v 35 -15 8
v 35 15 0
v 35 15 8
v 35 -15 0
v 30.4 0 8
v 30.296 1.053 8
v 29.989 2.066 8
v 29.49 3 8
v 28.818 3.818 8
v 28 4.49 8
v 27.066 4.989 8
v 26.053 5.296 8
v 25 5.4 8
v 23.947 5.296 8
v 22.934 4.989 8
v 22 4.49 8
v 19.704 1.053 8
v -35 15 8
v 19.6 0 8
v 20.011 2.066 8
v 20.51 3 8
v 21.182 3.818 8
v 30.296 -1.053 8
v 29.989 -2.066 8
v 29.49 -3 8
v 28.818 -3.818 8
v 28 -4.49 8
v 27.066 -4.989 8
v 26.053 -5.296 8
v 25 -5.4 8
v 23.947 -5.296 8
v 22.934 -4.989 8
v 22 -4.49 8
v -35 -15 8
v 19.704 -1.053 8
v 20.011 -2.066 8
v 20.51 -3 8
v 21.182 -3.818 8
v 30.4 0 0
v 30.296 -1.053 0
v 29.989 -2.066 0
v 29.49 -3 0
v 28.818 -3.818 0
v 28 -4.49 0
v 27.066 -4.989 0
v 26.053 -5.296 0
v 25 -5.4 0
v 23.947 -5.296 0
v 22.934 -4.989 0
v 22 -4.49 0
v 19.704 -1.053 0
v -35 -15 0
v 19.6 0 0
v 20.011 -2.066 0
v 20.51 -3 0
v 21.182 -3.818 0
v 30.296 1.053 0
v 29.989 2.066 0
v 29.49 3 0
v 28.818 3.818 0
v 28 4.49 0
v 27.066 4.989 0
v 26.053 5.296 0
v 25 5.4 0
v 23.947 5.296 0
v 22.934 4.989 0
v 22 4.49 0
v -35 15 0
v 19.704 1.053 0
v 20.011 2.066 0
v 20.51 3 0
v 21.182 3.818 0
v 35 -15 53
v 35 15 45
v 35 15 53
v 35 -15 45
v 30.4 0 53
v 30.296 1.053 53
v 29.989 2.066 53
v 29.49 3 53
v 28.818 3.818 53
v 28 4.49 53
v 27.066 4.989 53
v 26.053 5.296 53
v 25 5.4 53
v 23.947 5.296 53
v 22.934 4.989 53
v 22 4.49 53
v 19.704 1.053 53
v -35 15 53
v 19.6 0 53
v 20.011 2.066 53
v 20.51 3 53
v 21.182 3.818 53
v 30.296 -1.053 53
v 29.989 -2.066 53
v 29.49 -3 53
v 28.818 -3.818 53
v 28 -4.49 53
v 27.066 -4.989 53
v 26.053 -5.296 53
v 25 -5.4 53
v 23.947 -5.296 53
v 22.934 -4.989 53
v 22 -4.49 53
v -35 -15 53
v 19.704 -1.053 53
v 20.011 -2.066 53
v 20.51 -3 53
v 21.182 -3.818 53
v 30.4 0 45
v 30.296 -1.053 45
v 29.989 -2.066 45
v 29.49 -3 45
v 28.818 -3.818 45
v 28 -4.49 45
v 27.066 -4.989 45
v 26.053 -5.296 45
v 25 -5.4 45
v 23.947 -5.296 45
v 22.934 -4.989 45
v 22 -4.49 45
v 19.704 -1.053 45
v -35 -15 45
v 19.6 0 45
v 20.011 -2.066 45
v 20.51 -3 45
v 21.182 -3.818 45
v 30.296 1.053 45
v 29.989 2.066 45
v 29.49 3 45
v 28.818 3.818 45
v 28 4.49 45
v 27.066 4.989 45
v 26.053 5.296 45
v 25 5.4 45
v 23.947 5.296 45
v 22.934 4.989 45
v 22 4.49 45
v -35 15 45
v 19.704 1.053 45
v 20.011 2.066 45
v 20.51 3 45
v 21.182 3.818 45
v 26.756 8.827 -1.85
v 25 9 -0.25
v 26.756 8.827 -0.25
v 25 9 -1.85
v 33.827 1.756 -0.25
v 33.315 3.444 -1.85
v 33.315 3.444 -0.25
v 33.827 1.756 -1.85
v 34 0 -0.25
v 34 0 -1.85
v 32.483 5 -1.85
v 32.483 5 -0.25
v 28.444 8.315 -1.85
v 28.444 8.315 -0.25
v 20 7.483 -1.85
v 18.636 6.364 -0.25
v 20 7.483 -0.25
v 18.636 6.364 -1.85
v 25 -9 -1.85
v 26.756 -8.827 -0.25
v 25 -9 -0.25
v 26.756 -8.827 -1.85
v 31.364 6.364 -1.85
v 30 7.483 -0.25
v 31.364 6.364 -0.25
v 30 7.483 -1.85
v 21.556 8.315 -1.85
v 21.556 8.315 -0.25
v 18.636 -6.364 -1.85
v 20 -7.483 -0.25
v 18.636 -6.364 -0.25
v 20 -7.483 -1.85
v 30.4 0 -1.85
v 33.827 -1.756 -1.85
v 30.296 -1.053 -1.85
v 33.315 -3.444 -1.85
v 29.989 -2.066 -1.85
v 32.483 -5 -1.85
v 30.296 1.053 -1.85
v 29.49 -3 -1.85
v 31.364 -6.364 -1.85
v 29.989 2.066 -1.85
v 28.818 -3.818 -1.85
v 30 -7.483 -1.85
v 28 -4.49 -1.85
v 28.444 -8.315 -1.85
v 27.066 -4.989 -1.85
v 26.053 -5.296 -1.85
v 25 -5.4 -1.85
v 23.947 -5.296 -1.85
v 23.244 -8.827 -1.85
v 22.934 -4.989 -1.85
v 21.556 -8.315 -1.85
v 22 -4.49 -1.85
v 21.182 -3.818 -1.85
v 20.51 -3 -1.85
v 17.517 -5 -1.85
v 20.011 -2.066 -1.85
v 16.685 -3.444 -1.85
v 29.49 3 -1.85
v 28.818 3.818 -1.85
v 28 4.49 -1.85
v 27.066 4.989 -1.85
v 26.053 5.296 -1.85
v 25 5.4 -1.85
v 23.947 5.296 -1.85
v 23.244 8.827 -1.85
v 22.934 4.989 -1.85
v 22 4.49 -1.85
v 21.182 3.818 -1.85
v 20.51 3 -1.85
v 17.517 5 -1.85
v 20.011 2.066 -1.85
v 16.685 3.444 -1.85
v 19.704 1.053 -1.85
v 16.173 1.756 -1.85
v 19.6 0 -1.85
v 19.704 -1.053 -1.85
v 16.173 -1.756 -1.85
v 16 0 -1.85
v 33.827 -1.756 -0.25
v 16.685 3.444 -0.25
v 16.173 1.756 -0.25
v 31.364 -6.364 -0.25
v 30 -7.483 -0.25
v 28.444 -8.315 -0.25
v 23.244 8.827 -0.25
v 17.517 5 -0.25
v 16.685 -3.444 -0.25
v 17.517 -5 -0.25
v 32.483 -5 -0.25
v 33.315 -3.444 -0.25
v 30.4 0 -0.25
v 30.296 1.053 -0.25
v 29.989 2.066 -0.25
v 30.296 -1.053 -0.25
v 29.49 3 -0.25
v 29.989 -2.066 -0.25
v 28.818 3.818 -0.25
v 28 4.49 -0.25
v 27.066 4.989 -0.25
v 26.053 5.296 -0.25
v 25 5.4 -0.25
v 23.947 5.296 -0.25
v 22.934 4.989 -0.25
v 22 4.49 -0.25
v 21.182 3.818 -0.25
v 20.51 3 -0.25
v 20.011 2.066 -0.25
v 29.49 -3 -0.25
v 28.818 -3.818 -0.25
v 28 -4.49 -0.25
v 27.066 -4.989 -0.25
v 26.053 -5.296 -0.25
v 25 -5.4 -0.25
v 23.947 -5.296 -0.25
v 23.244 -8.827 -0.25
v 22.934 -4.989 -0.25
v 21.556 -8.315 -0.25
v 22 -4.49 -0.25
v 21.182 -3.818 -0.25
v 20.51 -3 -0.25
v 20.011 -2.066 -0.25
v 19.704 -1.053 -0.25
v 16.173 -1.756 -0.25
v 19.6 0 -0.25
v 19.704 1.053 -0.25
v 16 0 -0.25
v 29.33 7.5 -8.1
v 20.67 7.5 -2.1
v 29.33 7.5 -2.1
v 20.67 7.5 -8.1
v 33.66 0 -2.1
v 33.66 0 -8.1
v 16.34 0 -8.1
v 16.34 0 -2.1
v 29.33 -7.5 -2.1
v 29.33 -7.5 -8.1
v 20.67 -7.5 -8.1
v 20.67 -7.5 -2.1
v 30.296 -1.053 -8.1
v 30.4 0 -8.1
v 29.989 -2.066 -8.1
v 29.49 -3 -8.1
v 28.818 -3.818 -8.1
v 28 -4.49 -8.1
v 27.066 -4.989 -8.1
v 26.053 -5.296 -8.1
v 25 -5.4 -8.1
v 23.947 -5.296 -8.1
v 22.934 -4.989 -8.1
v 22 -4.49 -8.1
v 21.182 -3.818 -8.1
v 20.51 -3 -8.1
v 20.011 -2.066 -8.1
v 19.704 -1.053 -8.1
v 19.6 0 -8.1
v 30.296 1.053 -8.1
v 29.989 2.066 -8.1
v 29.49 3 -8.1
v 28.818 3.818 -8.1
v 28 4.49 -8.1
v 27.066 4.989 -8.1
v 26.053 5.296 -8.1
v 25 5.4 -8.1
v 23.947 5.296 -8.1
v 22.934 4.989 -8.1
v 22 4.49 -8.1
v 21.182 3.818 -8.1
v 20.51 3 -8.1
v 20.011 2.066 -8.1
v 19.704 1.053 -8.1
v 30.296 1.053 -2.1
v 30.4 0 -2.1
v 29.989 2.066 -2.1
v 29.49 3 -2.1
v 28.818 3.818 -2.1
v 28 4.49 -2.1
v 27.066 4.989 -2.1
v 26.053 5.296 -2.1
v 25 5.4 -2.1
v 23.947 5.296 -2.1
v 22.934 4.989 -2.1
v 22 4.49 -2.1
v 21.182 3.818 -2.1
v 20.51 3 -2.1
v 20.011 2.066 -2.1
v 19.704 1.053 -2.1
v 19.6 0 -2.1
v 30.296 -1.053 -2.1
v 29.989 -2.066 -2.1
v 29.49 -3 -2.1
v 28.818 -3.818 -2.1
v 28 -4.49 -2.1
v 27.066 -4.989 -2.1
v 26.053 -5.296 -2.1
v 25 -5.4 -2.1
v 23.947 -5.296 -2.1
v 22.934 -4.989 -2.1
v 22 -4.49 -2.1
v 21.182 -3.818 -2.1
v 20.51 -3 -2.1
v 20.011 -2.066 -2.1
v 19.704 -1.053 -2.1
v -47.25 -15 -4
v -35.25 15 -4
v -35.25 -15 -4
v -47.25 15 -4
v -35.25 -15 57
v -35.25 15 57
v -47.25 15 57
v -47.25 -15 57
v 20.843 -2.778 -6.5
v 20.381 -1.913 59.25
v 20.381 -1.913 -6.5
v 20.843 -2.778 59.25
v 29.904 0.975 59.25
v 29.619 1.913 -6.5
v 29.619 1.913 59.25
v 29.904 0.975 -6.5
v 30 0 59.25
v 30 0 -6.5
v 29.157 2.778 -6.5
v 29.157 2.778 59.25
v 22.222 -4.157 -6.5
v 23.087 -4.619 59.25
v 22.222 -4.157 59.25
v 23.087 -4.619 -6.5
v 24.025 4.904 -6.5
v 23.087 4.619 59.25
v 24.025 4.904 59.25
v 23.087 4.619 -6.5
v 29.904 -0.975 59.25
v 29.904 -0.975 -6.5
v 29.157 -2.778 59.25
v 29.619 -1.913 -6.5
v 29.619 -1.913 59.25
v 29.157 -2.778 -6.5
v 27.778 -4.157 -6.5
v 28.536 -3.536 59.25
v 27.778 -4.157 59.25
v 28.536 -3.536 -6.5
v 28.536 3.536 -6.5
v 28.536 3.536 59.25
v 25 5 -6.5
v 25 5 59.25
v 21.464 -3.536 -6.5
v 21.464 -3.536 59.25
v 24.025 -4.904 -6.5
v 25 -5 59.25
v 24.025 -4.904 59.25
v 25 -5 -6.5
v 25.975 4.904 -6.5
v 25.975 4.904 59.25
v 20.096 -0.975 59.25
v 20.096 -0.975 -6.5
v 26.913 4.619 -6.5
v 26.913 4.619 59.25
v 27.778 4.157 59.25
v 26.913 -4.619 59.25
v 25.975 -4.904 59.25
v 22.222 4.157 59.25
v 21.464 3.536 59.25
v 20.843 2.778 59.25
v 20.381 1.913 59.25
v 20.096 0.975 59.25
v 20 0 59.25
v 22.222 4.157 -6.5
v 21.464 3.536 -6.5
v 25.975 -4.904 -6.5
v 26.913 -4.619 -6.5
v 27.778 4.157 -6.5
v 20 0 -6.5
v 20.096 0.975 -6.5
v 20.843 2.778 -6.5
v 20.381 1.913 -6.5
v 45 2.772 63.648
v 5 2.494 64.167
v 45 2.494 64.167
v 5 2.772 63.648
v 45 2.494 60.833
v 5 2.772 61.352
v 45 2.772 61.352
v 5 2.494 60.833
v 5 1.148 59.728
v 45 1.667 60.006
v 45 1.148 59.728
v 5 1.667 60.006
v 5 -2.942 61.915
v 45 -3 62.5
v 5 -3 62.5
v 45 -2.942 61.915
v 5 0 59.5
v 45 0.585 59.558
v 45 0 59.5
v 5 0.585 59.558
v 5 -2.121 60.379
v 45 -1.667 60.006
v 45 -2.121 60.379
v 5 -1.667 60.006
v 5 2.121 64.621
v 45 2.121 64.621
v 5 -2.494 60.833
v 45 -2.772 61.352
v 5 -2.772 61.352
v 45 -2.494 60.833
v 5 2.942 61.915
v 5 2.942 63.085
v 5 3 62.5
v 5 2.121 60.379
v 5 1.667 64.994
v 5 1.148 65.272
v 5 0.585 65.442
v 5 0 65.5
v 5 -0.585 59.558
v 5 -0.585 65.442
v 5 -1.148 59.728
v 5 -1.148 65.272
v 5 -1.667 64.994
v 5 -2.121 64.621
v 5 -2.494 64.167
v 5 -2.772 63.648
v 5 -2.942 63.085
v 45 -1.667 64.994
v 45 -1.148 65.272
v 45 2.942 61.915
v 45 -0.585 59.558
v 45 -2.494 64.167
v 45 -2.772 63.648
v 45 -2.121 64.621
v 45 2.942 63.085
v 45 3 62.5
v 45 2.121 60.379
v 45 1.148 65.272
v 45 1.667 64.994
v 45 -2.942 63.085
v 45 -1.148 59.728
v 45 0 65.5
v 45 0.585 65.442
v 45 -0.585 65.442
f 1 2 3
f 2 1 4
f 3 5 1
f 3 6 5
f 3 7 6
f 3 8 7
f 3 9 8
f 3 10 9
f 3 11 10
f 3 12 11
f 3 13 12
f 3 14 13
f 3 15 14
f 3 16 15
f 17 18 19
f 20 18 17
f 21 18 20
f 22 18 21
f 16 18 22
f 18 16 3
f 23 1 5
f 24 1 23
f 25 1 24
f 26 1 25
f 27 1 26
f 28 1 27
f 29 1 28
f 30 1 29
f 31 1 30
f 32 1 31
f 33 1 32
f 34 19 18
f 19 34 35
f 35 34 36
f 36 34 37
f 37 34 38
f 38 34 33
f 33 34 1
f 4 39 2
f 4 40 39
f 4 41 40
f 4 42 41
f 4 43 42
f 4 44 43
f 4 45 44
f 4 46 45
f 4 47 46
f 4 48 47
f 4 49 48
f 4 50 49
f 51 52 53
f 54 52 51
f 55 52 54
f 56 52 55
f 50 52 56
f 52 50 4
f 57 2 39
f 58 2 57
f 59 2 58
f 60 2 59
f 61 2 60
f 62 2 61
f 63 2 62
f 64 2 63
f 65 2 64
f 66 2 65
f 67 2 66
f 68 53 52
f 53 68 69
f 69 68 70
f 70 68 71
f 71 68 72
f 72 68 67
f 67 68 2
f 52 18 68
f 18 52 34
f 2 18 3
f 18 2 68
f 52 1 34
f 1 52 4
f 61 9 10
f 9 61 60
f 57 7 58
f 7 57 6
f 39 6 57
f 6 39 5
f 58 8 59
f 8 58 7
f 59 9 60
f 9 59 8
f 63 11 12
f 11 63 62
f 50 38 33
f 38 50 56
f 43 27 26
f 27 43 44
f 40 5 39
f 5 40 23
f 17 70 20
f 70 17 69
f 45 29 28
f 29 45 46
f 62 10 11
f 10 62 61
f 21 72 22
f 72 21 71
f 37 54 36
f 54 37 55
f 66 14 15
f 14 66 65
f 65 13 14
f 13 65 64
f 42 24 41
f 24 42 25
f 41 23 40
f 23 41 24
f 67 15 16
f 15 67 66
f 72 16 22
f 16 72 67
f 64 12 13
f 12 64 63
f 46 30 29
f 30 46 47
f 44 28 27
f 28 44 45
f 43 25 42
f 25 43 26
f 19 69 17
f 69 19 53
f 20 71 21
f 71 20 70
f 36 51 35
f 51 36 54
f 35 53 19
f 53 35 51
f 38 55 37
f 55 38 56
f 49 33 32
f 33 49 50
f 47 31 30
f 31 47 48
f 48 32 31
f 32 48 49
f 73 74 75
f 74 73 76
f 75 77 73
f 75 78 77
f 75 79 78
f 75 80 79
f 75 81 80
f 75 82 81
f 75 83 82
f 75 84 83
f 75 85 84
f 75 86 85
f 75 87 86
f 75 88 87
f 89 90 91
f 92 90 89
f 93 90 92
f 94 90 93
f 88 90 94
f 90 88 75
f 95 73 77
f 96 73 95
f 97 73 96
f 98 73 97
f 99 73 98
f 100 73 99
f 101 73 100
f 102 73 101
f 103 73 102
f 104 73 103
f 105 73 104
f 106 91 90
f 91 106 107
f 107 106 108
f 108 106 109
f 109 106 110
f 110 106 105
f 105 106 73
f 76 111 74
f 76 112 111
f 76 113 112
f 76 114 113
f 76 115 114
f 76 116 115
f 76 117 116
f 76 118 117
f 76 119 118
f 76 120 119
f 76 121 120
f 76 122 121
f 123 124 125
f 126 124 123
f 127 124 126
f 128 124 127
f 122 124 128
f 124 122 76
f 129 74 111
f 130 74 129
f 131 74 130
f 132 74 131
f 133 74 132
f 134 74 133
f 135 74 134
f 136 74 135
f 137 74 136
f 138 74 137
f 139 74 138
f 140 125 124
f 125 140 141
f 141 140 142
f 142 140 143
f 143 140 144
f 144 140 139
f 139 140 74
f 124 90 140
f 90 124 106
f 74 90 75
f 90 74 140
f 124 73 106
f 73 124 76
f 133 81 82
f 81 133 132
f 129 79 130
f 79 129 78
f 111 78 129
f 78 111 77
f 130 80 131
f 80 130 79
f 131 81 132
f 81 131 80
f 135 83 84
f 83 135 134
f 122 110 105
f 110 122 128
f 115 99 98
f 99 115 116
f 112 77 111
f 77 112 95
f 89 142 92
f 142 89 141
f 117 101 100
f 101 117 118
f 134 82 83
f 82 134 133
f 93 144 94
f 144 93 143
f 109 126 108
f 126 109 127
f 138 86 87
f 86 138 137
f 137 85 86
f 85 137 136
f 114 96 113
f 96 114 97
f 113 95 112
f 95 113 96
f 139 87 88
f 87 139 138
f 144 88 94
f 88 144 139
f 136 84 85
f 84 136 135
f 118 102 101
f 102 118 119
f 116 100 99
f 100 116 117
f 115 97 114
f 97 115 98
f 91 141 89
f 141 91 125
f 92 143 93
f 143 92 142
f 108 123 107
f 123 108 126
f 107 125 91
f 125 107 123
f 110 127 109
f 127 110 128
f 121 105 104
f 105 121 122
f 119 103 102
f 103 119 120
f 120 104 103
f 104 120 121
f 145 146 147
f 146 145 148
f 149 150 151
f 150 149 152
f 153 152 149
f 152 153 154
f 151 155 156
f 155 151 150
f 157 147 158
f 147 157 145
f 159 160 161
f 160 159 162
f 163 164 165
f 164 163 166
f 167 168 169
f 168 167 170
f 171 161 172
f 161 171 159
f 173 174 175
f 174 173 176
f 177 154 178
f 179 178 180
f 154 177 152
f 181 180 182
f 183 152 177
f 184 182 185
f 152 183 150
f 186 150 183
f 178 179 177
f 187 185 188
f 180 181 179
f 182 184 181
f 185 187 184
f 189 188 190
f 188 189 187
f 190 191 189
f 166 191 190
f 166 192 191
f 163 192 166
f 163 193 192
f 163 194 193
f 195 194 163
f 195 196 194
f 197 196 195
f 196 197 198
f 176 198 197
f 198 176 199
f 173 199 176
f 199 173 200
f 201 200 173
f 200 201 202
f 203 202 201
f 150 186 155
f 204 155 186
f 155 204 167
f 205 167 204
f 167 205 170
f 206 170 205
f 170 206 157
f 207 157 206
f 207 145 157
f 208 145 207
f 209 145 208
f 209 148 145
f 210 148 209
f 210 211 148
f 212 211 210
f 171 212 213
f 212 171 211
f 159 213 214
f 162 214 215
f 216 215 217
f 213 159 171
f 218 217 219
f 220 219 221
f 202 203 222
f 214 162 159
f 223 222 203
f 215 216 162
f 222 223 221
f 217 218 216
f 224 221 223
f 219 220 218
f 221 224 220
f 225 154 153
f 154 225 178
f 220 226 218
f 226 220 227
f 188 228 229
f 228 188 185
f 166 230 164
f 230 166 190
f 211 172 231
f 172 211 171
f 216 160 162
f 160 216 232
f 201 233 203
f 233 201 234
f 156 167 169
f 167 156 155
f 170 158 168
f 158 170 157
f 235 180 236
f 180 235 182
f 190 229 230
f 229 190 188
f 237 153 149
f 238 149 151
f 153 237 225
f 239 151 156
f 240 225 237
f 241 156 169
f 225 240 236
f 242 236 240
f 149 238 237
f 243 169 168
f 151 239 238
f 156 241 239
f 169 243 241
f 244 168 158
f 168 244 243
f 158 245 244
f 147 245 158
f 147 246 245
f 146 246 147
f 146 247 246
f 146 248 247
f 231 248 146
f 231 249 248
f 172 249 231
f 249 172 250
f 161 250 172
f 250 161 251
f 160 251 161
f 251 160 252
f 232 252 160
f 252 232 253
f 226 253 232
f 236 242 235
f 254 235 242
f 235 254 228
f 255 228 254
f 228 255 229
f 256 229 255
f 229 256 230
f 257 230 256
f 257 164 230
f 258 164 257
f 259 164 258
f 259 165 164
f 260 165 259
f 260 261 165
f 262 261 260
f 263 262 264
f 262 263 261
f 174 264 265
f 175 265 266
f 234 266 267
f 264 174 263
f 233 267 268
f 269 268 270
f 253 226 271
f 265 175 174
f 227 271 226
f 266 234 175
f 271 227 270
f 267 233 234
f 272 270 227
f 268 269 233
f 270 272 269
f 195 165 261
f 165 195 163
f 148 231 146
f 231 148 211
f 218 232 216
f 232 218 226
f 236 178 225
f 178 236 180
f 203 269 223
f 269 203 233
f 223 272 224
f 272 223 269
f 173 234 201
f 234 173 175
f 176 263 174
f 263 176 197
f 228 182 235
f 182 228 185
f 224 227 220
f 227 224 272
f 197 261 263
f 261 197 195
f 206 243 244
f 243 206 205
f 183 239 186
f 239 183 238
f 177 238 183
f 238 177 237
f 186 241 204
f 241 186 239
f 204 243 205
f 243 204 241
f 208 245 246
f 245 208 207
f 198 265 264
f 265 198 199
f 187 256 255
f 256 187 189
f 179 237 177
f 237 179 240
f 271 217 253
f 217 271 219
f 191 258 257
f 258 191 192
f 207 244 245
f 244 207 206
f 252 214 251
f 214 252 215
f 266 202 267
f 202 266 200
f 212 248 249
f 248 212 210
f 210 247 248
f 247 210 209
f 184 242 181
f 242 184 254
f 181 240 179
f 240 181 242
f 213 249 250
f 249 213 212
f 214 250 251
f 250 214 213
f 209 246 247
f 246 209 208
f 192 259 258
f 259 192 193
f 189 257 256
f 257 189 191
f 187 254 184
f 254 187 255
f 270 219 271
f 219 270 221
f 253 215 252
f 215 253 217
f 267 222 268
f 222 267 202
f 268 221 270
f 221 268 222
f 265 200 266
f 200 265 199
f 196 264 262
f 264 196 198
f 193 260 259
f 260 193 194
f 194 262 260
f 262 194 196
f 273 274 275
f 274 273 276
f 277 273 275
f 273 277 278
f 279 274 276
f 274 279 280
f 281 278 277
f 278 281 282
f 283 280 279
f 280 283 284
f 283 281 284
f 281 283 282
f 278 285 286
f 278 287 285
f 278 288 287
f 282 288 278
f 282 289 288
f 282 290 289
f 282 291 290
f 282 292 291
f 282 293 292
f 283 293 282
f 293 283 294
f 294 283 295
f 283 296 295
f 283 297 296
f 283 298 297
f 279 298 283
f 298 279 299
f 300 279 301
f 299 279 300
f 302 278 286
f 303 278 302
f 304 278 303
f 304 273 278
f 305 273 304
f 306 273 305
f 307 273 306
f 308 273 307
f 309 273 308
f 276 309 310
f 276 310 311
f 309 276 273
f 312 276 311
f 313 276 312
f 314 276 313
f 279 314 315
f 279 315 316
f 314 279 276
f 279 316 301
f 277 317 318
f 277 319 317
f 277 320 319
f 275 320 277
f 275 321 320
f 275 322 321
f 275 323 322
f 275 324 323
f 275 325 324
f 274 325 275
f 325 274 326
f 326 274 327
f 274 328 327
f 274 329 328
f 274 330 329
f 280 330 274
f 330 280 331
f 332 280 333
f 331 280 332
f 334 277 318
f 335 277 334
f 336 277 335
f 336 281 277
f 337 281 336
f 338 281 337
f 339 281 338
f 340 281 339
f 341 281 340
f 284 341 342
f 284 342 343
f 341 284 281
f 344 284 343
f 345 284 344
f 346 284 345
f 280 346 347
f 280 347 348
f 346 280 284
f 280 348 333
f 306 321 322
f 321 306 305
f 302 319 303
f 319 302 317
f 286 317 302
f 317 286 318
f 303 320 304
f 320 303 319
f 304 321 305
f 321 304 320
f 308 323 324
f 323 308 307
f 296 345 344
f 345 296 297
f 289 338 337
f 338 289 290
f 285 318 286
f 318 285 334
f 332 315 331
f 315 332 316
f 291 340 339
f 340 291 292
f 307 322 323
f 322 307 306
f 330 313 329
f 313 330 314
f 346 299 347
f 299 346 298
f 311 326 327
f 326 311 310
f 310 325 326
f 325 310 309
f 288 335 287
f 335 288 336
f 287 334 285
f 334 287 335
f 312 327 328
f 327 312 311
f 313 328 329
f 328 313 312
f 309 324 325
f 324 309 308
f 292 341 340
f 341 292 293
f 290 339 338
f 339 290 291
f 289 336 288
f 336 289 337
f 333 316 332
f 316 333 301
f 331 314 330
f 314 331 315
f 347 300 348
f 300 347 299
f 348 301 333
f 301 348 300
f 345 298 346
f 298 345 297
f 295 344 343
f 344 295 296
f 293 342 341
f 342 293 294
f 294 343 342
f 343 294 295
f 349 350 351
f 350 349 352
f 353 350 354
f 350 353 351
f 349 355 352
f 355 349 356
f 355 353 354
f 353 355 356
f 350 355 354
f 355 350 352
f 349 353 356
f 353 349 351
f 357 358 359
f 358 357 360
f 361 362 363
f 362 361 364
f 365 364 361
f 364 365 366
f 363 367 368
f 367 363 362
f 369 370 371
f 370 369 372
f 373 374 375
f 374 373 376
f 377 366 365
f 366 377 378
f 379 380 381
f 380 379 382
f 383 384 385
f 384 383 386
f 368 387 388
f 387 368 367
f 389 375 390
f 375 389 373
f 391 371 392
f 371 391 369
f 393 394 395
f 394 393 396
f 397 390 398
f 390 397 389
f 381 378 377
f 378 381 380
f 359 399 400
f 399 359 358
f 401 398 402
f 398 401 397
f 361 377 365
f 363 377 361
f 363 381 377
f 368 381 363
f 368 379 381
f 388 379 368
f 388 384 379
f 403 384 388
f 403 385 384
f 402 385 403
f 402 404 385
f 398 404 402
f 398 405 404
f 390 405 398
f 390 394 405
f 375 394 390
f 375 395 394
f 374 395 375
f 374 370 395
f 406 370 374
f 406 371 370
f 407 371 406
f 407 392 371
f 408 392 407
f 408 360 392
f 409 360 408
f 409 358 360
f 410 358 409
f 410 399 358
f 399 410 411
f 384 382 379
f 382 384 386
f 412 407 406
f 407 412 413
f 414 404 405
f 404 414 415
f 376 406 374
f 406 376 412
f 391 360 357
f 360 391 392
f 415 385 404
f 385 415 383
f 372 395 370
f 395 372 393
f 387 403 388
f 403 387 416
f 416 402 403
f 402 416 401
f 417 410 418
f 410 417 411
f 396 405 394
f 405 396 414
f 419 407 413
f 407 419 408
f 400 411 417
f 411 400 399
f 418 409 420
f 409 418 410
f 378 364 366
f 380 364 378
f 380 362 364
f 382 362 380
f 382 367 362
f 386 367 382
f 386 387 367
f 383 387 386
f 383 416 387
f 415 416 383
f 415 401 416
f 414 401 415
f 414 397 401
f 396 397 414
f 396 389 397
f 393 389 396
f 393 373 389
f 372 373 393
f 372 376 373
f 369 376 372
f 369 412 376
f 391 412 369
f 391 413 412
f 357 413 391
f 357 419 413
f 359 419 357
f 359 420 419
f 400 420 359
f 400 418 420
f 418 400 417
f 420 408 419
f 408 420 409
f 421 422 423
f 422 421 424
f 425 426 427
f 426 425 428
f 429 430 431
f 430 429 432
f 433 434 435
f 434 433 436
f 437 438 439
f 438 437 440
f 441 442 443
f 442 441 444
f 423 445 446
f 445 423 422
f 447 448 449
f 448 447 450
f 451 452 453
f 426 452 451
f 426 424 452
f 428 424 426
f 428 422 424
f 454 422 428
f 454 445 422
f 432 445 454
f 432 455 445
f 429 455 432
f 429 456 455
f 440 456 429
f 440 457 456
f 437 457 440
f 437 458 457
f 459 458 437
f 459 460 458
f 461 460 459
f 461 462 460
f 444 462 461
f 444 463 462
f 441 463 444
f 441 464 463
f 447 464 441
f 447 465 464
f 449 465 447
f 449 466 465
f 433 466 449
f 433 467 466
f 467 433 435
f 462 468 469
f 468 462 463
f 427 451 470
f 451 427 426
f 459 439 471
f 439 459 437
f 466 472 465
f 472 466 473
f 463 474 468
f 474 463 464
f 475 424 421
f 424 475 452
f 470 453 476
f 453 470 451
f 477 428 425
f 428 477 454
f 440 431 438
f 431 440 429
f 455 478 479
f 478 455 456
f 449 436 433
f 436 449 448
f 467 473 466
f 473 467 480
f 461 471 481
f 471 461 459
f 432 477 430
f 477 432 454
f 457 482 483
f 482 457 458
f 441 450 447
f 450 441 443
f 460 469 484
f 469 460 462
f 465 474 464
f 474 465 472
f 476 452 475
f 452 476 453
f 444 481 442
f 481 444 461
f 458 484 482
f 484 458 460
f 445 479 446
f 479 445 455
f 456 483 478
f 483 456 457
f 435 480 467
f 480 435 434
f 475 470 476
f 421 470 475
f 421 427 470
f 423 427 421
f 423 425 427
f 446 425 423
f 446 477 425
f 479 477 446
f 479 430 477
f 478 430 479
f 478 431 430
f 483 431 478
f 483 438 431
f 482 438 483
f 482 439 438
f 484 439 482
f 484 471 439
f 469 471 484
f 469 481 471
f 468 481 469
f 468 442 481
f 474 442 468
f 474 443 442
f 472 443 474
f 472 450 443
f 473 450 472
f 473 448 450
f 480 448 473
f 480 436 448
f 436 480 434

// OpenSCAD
$fn = 32;

// ------------------------------------------------------------------------
// C clamp: throat 45 mm, screw d10
// Every part is its own module, assembly() places every instance.
// ------------------------------------------------------------------------

// --- part 1 ---
module clamp_arm() {
  difference() {
    translate([-35, -15, 0]) cube([70, 30, 8]);
    translate([25, 0, -1]) cylinder(h = 10, d = 10.8);
  }
}

// --- part 2 ---
module clamp_spine() {
  difference() {
    translate([-30.5, -15, 0]) cube([61, 30, 12]);
  }
}

// --- part 3 ---
module clamp_screw() {
  translate([0, 0, -32.875]) cylinder(h = 65.75, d = 10);
}

// --- part 4 ---
module clamp_washer() {
  difference() {
      translate([0, 0, 0]) cylinder(h = 1.6, d = 18);
      translate([0, 0, -1]) cylinder(h = 3.6, d = 10.8);
    }
}

// --- part 5 ---
module clamp_nut() {
  difference() {
    linear_extrude(height = 6) polygon(points = [[8.66, 0], [4.33, 7.5], [-4.33, 7.5], [-8.66, 0], [-4.33, -7.5], [4.33, -7.5]]);
    translate([0, 0, -1]) cylinder(h = 8, d = 10.8);
  }
}

// --- part 6 ---
module tommy_bar() {
  translate([0, 0, -20]) cylinder(h = 40, d = 6);
}

// --- assembly ---
module assembly() {
  color([0.80, 0.24, 0.20]) translate([0, 0, 0]) rotate([0, 0, 0]) clamp_arm();
  color([0.20, 0.45, 0.75]) translate([0, 0, 45]) rotate([0, 0, 0]) clamp_arm();
  color([0.25, 0.62, 0.32]) translate([-47.25, 0, 26.5]) rotate([0, 90, 0]) clamp_spine();
  color([0.92, 0.70, 0.18]) translate([25, 0, 26.375]) rotate([0, 0, 0]) clamp_screw();
  color([0.58, 0.35, 0.70]) translate([25, 0, -1.85]) rotate([0, 0, 0]) clamp_washer();
  color([0.16, 0.66, 0.66]) translate([25, 0, -8.1]) rotate([0, 0, 0]) clamp_nut();
  color([0.85, 0.48, 0.18]) translate([25, 0, 62.5]) rotate([0, 90, 0]) tommy_bar();
}

assembly();
